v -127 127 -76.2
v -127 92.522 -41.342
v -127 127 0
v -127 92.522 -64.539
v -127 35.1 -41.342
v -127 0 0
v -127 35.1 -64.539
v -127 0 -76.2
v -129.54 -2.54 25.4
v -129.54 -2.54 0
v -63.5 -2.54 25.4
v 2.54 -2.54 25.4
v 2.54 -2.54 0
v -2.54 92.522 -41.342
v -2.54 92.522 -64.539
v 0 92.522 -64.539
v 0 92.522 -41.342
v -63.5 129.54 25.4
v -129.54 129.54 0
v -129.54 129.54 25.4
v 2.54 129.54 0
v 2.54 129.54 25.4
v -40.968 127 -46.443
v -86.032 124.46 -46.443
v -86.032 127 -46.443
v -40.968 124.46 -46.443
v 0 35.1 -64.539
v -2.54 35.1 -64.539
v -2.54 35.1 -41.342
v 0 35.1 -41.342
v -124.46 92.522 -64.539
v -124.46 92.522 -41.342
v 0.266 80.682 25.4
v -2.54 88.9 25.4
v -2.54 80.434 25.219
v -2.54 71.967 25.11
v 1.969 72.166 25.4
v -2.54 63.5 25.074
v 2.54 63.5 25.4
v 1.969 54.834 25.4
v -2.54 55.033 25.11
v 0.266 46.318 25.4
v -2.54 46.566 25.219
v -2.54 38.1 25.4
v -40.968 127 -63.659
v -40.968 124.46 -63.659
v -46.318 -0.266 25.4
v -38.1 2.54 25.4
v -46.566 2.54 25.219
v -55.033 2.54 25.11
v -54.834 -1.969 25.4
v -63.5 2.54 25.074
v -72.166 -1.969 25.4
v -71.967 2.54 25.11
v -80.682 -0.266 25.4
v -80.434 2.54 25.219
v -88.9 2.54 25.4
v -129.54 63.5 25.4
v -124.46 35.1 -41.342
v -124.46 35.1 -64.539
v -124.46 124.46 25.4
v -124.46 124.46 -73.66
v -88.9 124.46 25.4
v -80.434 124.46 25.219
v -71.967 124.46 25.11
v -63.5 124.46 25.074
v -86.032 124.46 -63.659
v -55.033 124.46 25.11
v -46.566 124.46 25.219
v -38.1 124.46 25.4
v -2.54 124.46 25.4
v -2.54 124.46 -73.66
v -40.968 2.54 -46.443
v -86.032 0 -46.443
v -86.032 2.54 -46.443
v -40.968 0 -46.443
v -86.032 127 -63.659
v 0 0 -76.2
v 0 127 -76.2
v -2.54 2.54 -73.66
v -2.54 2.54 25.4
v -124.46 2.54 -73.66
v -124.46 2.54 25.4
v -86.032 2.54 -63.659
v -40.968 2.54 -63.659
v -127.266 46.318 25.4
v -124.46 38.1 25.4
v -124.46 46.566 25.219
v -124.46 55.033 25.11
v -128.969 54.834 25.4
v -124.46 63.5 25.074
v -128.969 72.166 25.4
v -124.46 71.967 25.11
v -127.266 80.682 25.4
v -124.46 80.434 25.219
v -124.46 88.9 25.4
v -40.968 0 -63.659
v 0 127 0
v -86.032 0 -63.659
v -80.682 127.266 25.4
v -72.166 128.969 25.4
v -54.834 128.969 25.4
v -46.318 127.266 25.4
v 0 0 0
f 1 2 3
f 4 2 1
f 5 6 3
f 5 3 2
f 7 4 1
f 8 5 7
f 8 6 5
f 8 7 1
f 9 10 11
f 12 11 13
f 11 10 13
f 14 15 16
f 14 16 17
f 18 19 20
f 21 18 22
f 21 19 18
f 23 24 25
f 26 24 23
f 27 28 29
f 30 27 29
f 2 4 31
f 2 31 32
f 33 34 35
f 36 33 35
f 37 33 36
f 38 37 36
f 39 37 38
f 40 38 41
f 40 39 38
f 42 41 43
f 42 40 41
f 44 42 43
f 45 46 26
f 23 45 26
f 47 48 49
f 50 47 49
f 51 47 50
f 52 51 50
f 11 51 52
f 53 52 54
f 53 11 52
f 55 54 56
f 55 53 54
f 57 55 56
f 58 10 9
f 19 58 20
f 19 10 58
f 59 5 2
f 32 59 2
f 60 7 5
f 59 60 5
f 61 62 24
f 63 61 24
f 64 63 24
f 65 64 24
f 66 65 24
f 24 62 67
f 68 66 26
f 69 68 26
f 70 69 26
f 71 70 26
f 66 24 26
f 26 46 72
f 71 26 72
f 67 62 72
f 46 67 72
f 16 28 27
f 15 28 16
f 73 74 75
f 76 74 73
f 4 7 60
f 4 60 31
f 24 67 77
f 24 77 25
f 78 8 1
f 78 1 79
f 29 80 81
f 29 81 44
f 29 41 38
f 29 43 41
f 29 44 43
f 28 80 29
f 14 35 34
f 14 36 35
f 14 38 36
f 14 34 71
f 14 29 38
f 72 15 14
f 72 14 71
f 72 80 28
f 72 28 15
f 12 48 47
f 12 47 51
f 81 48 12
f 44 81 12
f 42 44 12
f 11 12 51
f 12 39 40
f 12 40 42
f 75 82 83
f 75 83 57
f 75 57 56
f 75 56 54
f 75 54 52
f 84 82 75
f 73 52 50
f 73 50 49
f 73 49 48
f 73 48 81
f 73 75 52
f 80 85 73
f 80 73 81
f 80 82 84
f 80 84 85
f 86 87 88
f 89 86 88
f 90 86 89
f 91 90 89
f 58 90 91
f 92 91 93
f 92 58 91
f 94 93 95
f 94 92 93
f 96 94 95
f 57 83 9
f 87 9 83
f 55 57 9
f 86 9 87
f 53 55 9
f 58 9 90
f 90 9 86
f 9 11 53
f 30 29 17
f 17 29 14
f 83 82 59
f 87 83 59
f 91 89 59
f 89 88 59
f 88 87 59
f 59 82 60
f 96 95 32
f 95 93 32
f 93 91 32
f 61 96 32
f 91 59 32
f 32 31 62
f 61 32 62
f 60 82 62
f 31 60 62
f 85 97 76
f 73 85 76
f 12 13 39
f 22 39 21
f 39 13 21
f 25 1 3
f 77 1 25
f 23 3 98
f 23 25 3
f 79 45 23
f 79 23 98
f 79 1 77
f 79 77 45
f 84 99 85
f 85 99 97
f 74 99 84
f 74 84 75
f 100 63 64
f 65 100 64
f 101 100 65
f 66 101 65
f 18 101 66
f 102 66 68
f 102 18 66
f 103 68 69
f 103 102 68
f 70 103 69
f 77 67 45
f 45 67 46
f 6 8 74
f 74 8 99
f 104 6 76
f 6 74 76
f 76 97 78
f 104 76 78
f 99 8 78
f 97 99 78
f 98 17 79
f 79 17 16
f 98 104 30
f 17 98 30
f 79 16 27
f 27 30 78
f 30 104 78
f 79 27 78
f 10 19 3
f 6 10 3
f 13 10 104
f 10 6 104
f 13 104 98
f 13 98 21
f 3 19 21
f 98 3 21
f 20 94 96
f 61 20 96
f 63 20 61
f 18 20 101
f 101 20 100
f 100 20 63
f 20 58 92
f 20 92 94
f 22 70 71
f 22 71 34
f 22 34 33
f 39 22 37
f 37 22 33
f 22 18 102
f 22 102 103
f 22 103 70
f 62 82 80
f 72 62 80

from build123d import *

# Parameters (mm, degrees)
SKETCH1_W           = 127
SKETCH1_H           = 76.2
BOSS_EXTRUDE1_DEPTH = 127
SHELL1_T            = -2.54
SKETCH2_W           = 132.08
SKETCH2_H           = 132.08
SKETCH2_W_2         = 121.92
SKETCH2_H_2         = 121.92
BOSS_EXTRUDE2_DEPTH = 25.4
SKETCH5_W           = 23.197534015
SKETCH5_H           = 57.422092124
CUT_EXTRUDE1_DEPTH  = 199.41286047
SKETCH6_W           = 45.064315034
SKETCH6_H           = 17.215386484
CUT_EXTRUDE2_DEPTH  = 199.41286047


with BuildPart() as part:
    # Sketch1 → Boss-Extrude1 (new body)
    with BuildSketch(Plane(origin=(0, 0, 0), x_dir=(1, 0, 0), z_dir=(0, 1, 0))):
        with Locations((-63.5, 38.1)):
            Rectangle(SKETCH1_W, SKETCH1_H)
    extrude(amount=BOSS_EXTRUDE1_DEPTH)

    # Shell1
    shell1_openings = [part.faces().sort_by_distance(p)[0] for p in [
        (-63.5, 63.5, 0),
    ]]
    offset(amount=SHELL1_T, openings=shell1_openings, kind=Kind.INTERSECTION)

    # Sketch2 → Boss-Extrude2 (add)
    with BuildSketch(Plane.XY):
        with Locations((-63.5, 63.5)):
            Rectangle(SKETCH2_W, SKETCH2_H)
        with Locations((-63.5, 63.5)):
            Rectangle(SKETCH2_W_2, SKETCH2_H_2, mode=Mode.SUBTRACT)
    extrude(amount=BOSS_EXTRUDE2_DEPTH)

    # Sketch3 → Cut-Revolve2 (revolve, cut)
    with BuildSketch(Plane.ZY.offset(63.5)):
        with BuildLine():
            ThreePointArc((23.19621529, 63.5), (1013.79621529, -927.1), (2004.39621529, 63.5))
            Line((2004.39621529, 63.5), (23.19621529, 63.5))
        make_face()
    revolve(axis=Axis((-63.5, 63.5, 2004.39621529), (0, 0, -1)), mode=Mode.SUBTRACT)

    # Sketch5 → Cut-Extrude1 (cut, through all)
    with BuildSketch(Plane.ZY.offset(127)):
        with Locations((-52.940293684, 63.810930306)):
            Rectangle(SKETCH5_W, SKETCH5_H)
    extrude(amount=-CUT_EXTRUDE1_DEPTH, mode=Mode.SUBTRACT)

    # Sketch6 → Cut-Extrude2 (cut, through all)
    with BuildSketch(Plane.XZ):
        with Locations((-63.5, -55.050992996)):
            Rectangle(SKETCH6_W, SKETCH6_H)
    extrude(amount=-CUT_EXTRUDE2_DEPTH, mode=Mode.SUBTRACT)


solid = part.part
